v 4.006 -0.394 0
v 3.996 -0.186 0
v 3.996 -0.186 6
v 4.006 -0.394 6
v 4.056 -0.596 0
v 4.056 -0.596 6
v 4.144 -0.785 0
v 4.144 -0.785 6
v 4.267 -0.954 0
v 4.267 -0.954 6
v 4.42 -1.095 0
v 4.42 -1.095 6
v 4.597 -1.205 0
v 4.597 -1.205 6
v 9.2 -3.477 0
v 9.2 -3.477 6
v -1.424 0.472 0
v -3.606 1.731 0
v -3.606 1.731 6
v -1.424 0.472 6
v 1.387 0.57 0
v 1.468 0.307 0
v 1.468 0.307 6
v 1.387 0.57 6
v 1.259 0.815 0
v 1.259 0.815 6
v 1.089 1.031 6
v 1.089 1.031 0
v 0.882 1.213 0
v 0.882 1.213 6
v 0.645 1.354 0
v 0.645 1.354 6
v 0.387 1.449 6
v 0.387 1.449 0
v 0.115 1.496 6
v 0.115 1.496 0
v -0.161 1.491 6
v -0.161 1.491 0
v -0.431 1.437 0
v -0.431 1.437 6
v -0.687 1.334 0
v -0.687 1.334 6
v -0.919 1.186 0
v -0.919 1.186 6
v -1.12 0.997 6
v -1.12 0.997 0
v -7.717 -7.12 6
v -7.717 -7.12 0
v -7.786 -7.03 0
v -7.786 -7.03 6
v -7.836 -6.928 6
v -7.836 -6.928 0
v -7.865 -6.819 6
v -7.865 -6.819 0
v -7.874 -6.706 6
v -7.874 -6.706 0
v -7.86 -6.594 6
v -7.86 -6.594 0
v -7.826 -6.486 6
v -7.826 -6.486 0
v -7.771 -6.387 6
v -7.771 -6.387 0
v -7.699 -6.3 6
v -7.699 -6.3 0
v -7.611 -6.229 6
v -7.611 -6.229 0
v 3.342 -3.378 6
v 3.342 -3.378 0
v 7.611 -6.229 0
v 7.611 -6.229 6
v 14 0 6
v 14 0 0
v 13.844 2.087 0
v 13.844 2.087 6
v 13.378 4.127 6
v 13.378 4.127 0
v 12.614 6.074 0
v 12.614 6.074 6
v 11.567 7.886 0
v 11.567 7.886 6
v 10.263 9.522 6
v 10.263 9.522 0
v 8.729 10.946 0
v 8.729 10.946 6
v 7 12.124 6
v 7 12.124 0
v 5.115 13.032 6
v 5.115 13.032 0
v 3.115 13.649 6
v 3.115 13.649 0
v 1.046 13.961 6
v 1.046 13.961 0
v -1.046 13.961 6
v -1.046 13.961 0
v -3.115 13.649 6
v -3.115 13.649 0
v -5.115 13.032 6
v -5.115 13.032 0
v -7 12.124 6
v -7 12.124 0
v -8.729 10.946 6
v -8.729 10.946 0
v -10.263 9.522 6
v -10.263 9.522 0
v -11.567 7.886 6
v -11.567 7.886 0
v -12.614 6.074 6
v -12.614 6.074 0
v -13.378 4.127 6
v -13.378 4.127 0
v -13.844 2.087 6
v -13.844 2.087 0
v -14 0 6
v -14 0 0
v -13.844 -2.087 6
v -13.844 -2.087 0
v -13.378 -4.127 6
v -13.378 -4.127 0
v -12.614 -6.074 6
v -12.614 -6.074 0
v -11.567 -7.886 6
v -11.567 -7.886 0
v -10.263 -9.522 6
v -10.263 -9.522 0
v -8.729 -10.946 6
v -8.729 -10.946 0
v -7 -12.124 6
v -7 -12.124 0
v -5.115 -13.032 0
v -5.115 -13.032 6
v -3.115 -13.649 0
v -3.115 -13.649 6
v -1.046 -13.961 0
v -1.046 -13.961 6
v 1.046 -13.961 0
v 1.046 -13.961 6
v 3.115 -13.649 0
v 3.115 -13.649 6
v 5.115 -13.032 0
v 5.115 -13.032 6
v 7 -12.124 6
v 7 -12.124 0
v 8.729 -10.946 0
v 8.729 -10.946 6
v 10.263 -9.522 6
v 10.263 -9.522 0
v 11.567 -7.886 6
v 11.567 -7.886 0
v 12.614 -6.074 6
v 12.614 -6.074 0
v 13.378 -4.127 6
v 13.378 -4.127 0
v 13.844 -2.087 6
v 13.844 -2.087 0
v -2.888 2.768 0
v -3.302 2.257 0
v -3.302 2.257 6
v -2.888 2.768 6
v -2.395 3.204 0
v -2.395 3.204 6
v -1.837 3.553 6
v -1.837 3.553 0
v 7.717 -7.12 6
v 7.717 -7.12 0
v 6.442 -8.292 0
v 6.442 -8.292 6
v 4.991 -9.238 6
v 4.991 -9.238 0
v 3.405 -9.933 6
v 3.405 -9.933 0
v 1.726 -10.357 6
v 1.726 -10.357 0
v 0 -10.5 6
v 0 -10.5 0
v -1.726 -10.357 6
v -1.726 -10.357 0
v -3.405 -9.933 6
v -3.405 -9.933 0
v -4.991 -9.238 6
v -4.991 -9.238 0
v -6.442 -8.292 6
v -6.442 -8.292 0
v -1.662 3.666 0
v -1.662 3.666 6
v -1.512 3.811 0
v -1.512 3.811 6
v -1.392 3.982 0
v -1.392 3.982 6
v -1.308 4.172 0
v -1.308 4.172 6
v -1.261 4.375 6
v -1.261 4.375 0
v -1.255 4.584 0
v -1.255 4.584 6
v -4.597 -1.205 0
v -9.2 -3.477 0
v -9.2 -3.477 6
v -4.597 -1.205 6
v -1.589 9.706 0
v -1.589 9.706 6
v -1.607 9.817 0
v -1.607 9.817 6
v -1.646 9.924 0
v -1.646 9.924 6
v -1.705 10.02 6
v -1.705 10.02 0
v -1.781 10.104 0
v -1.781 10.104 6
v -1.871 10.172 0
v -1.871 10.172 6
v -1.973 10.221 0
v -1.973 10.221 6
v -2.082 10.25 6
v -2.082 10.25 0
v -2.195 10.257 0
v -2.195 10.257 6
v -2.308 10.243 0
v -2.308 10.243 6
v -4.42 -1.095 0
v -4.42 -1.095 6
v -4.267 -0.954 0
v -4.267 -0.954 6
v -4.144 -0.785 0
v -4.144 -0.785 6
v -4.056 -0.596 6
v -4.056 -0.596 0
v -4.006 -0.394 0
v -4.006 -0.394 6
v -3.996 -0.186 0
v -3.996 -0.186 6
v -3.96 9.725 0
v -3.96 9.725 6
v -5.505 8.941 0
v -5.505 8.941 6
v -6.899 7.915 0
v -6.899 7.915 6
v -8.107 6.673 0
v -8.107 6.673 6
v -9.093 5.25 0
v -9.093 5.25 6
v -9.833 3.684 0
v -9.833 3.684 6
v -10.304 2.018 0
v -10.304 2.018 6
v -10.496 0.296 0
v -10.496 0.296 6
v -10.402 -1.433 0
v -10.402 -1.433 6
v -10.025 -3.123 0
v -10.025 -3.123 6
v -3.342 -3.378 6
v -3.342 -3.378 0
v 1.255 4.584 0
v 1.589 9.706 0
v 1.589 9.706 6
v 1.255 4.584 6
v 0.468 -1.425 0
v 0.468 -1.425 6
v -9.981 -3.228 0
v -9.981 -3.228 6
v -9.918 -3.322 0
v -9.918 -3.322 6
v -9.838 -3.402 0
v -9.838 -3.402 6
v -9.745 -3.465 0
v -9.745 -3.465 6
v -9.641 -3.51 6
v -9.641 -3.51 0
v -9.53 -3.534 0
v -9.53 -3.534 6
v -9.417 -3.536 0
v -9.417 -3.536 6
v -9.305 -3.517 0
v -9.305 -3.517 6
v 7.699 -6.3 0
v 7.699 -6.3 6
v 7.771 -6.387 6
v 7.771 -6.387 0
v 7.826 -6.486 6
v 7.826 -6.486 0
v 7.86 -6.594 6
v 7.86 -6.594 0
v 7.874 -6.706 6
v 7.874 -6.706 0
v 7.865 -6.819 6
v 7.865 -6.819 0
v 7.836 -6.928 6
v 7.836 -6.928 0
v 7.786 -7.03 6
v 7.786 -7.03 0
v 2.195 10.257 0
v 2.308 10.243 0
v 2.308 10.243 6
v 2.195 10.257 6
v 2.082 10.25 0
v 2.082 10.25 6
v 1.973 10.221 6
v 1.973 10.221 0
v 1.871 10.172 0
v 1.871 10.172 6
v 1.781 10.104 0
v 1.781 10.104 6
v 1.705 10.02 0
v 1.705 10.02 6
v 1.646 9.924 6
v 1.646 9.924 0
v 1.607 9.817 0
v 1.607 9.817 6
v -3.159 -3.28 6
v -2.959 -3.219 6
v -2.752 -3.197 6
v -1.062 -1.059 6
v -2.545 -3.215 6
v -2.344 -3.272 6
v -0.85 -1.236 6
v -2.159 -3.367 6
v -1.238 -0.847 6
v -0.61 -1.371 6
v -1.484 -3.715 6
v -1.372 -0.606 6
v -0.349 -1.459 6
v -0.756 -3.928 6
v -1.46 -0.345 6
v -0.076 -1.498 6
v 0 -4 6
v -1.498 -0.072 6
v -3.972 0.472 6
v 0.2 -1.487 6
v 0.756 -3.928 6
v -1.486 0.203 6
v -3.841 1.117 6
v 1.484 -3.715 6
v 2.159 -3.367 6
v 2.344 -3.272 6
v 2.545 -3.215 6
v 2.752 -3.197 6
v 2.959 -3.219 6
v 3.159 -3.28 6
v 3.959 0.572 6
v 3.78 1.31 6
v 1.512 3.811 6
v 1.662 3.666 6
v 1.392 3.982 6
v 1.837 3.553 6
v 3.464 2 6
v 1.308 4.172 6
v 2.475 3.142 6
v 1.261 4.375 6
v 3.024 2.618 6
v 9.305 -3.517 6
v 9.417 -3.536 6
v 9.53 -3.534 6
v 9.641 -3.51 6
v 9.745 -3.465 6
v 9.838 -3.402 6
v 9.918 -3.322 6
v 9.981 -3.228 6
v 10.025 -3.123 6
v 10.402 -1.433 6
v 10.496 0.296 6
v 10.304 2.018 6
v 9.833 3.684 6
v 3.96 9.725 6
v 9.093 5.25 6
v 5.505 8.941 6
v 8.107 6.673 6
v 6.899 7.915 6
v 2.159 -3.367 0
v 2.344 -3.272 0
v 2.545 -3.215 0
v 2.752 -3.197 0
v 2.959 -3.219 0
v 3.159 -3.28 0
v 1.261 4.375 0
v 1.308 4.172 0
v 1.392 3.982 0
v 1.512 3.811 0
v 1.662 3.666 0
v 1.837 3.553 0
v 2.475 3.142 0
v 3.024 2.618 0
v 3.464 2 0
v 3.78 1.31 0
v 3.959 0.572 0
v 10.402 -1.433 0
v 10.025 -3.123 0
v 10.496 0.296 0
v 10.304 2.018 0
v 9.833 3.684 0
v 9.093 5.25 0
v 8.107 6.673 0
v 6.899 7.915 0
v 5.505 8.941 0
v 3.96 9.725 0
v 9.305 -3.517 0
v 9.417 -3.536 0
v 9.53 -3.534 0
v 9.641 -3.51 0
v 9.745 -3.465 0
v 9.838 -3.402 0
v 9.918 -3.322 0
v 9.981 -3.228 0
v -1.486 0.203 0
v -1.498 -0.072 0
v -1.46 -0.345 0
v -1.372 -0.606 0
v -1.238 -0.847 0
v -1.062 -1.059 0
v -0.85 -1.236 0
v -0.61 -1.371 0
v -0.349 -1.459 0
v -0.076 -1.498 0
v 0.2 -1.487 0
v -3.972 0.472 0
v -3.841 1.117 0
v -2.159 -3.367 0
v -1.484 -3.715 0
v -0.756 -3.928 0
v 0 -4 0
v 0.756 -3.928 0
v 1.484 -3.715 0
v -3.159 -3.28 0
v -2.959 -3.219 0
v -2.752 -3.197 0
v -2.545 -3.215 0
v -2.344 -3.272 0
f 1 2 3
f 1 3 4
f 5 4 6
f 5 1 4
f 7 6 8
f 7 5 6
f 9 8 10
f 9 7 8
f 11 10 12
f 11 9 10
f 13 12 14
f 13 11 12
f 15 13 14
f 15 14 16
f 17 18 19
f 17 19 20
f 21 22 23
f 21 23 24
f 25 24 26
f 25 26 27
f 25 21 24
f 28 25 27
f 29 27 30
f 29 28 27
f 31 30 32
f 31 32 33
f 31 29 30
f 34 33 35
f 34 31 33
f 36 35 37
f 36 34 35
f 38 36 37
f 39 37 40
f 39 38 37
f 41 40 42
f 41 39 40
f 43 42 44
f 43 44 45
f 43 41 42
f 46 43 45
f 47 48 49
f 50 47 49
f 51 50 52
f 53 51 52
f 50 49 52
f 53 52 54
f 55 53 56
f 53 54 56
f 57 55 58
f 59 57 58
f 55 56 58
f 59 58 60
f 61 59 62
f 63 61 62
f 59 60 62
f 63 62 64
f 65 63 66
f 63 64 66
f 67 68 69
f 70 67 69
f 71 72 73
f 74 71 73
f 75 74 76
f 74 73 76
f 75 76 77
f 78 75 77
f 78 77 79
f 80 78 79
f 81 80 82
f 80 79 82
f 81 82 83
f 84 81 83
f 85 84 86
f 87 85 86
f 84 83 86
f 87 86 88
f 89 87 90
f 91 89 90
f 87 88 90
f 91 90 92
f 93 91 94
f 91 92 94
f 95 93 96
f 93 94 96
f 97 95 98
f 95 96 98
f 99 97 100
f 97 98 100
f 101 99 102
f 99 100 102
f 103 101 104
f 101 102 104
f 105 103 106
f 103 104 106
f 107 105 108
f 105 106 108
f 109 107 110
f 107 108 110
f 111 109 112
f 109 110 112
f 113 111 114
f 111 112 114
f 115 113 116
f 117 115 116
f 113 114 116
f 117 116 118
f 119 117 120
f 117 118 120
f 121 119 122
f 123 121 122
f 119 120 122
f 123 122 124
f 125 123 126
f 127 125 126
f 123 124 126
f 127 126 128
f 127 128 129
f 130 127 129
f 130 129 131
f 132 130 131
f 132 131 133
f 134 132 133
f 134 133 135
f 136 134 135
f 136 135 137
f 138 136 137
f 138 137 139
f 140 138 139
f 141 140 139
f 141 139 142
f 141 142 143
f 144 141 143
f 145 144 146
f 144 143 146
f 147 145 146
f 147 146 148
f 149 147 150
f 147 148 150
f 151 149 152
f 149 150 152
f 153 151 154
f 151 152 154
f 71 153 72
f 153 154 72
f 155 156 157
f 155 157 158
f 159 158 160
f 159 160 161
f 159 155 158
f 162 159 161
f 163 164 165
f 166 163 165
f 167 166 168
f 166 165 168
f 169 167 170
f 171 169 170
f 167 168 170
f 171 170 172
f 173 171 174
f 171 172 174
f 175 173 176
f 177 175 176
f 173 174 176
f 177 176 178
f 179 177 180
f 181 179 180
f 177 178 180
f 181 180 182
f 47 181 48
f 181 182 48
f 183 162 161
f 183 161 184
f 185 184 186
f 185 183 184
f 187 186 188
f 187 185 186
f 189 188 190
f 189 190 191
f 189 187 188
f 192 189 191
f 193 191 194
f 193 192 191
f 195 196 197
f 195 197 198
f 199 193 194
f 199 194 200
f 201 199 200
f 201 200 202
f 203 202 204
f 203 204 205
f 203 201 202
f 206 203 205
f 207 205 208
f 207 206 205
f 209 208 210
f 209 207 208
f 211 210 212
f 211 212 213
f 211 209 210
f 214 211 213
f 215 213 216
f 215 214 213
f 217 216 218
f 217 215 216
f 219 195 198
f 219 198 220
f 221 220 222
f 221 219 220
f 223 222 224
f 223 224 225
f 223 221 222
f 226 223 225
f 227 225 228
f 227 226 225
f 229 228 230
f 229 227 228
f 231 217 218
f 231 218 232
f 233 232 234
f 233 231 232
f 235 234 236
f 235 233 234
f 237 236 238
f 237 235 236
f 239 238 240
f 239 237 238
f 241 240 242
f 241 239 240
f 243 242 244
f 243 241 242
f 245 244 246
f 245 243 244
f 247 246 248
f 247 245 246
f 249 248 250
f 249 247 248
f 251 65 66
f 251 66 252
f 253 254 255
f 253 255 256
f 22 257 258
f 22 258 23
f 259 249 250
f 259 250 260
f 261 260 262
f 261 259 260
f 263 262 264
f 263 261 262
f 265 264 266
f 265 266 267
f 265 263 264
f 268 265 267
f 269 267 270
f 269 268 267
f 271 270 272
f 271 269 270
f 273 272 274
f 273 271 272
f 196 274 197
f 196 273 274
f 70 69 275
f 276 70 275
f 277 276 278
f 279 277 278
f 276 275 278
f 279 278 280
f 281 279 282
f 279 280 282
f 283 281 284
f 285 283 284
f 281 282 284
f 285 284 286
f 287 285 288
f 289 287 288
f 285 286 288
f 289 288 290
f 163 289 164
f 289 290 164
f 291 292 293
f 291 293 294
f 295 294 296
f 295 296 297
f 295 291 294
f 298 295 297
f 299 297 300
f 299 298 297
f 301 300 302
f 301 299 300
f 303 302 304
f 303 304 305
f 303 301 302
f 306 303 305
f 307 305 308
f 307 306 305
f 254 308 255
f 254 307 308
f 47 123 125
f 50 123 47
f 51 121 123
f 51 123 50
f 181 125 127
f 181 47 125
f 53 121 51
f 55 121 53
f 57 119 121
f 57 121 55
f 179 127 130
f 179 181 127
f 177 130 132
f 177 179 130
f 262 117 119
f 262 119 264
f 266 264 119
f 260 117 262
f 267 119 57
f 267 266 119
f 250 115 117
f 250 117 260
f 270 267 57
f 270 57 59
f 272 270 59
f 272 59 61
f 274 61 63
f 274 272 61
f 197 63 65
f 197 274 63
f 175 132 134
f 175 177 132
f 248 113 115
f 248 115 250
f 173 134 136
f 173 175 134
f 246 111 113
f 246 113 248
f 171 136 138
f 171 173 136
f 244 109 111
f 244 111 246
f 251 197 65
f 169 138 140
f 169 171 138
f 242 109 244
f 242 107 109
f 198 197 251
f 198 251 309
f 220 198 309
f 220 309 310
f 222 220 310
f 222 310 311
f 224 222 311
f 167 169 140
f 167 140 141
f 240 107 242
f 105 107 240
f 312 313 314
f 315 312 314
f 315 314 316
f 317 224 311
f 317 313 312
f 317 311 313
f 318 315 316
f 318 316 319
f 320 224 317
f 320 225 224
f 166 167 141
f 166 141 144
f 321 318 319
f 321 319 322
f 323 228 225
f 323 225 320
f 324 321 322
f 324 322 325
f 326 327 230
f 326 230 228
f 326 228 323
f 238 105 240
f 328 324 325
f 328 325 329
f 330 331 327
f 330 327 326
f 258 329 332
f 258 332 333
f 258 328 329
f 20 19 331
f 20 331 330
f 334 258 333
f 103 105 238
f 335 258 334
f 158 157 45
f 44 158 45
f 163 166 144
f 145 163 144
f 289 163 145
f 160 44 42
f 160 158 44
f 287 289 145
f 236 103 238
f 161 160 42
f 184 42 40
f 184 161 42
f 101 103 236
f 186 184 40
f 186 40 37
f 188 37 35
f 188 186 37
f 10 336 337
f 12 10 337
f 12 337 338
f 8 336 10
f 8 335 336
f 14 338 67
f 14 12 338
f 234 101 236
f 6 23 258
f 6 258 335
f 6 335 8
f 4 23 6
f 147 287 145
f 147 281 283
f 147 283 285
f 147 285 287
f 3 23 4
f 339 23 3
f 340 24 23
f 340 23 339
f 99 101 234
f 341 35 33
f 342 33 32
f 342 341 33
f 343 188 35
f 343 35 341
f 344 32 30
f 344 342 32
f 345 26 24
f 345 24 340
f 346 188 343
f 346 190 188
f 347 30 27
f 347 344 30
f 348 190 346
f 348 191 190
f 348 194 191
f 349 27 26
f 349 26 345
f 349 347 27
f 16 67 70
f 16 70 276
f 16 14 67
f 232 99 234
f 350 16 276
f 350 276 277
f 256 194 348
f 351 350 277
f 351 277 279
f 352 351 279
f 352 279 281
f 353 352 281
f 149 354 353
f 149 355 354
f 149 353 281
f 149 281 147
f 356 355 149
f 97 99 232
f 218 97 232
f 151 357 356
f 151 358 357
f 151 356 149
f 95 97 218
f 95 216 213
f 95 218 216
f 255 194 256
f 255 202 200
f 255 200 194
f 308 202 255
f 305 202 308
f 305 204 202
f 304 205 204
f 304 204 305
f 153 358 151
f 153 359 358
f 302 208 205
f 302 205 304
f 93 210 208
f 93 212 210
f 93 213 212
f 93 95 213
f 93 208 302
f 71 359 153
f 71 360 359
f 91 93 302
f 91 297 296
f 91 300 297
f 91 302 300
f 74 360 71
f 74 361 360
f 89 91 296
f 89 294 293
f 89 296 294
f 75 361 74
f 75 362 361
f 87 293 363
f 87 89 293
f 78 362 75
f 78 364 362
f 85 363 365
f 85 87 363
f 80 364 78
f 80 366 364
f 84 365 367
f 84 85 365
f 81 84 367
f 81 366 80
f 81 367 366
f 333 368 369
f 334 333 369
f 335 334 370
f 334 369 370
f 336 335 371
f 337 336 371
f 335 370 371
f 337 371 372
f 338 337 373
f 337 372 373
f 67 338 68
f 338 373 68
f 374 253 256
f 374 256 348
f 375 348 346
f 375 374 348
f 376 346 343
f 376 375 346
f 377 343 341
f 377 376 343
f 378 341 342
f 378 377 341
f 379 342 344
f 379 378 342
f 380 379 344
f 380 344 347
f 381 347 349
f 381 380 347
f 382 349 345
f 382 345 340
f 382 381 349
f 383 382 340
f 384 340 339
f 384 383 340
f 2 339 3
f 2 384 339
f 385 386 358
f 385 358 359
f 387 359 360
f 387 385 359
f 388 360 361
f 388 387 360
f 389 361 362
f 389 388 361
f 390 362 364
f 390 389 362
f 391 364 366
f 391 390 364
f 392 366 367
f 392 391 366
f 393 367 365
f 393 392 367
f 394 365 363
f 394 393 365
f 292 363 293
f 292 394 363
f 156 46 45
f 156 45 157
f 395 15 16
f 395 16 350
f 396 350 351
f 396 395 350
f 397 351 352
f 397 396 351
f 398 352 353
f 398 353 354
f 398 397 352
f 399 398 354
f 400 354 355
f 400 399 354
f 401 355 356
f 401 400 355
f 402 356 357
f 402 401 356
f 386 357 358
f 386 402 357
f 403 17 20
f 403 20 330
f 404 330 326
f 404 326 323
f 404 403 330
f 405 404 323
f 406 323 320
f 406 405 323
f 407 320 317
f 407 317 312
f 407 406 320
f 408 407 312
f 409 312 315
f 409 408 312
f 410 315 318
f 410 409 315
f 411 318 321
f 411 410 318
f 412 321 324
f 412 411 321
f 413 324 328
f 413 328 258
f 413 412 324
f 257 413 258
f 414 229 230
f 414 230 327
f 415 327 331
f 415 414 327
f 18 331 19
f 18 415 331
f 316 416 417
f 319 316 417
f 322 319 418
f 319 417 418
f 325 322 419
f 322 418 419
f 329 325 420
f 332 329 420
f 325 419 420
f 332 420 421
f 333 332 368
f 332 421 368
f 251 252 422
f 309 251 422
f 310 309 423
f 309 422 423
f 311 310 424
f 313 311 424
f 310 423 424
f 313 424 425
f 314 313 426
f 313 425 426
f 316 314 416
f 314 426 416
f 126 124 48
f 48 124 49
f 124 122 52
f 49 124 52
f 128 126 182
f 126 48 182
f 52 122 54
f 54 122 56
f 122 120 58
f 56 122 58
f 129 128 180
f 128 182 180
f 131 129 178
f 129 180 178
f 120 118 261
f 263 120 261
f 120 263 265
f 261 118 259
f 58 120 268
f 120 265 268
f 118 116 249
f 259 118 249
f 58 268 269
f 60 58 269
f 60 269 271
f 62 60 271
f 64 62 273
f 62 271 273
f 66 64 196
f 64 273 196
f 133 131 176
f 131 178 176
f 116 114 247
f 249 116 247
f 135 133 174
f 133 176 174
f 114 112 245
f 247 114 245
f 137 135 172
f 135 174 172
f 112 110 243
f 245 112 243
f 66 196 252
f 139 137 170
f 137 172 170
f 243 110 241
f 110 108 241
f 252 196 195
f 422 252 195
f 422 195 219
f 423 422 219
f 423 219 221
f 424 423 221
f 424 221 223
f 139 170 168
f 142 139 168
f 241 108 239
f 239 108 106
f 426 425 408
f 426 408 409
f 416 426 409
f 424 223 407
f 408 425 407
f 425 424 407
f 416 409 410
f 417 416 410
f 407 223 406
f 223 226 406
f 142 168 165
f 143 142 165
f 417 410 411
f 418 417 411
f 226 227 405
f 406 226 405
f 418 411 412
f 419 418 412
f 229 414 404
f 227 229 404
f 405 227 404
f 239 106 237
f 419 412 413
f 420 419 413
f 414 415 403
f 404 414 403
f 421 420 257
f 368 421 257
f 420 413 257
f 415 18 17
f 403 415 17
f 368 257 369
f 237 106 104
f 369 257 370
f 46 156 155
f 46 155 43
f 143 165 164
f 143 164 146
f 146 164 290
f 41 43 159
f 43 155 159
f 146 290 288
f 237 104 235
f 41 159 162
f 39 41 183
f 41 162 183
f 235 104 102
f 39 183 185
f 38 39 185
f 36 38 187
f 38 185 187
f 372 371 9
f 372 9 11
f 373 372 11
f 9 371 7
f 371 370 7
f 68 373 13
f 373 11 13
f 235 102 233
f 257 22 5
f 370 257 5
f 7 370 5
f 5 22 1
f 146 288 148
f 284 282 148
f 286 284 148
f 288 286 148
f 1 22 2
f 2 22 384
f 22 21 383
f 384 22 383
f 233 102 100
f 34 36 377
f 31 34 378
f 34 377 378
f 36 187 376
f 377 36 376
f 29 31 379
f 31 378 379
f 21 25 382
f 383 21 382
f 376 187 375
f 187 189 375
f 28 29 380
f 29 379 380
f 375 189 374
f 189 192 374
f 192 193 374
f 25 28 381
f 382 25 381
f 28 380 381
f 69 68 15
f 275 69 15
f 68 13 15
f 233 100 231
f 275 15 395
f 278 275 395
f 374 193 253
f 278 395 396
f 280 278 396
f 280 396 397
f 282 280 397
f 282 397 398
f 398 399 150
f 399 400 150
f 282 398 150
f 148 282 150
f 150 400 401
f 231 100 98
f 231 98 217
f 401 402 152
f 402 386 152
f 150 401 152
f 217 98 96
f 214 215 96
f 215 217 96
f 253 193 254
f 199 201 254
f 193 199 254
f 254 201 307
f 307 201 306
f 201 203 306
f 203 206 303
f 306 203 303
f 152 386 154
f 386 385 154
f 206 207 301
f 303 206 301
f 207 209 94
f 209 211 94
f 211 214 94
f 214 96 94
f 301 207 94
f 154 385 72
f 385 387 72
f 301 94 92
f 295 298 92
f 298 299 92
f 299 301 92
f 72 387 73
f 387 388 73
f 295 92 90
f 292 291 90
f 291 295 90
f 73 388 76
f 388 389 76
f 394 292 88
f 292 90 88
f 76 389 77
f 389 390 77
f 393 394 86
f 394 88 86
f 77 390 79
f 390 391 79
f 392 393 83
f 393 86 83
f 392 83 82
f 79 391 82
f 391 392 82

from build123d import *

# Parameters (mm, degrees)
SKETCH_1_R      = 14
EXTRUDE_1_DEPTH = 6


with BuildPart() as part:
    # 草图1 → 凸台-拉伸1 (new body)
    with BuildSketch(Plane.XY):
        Circle(SKETCH_1_R)
        with BuildLine():
            Line((4.596960215, -1.205253518), (9.199687971, -3.477076493))
            ThreePointArc((9.199687971, -3.477076493), (9.69373922, -3.490261664), (10.024736471, -3.123244898))
            ThreePointArc((10.024736471, -3.123244898), (9.09326674, 5.25), (2.307558811, 10.243298899))
            ThreePointArc((2.307558811, 10.243298899), (1.824214343, 10.140155255), (1.588607412, 9.705701736))
            Line((1.588607412, 9.705701736), (1.254699943, 4.583711086))
            ThreePointArc((1.254699943, 4.583711086), (1.392222532, 3.981727051), (1.836894199, 3.553282947))
            ThreePointArc((1.836894199, 3.553282947), (3.464101615, 2), (3.995680398, -0.185844433))
            ThreePointArc((3.995680398, -0.185844433), (4.144388043, -0.785163445), (4.596960215, -1.205253518))
        make_face(mode=Mode.SUBTRACT)
        with BuildLine():
            Line((-1.254699943, 4.583711086), (-1.588607412, 9.705701736))
            ThreePointArc((-1.588607412, 9.705701736), (-1.824214343, 10.140155255), (-2.307558811, 10.243298899))
            ThreePointArc((-2.307558811, 10.243298899), (-9.09326674, 5.25), (-10.024736471, -3.123244898))
            ThreePointArc((-10.024736471, -3.123244898), (-9.69373922, -3.490261664), (-9.199687971, -3.477076493))
            Line((-9.199687971, -3.477076493), (-4.596960215, -1.205253518))
            ThreePointArc((-4.596960215, -1.205253518), (-4.144388043, -0.785163445), (-3.995680398, -0.185844433))
            ThreePointArc((-3.995680398, -0.185844433), (-3.919805533, 0.79694704), (-3.605891638, 1.731342108))
            Line((-3.605891638, 1.731342108), (-1.423938852, 0.471591079))
            ThreePointArc((-1.423938852, 0.471591079), (-1.061904855, -1.059414026), (0.468245837, -1.425042398))
            Line((0.468245837, -1.425042398), (1.468245837, 0.307008409))
            ThreePointArc((1.468245837, 0.307008409), (0.386527032, 1.449343594), (-1.120379281, 0.99737168))
            Line((-1.120379281, 0.99737168), (-3.302332067, 2.257122708))
            ThreePointArc((-3.302332067, 2.257122708), (-2.650079149, 2.996177649), (-1.836894199, 3.553282947))
            ThreePointArc((-1.836894199, 3.553282947), (-1.392222532, 3.981727051), (-1.254699943, 4.583711086))
        make_face(mode=Mode.SUBTRACT)
        with BuildLine():
            Line((3.342260273, -3.378457568), (7.611080559, -6.228625243))
            ThreePointArc((7.611080559, -6.228625243), (7.869524877, -6.649893591), (7.717177659, -7.120054001))
            ThreePointArc((7.717177659, -7.120054001), (0, -10.5), (-7.717177659, -7.120054001))
            ThreePointArc((-7.717177659, -7.120054001), (-7.869524877, -6.649893591), (-7.611080559, -6.228625243))
            Line((-7.611080559, -6.228625243), (-3.342260273, -3.378457568))
            ThreePointArc((-3.342260273, -3.378457568), (-2.752165511, -3.196563606), (-2.1587862, -3.367438514))
            ThreePointArc((-2.1587862, -3.367438514), (0, -4), (2.1587862, -3.367438514))
            ThreePointArc((2.1587862, -3.367438514), (2.752165511, -3.196563606), (3.342260273, -3.378457568))
        make_face(mode=Mode.SUBTRACT)
    extrude(amount=EXTRUDE_1_DEPTH)


solid = part.part
